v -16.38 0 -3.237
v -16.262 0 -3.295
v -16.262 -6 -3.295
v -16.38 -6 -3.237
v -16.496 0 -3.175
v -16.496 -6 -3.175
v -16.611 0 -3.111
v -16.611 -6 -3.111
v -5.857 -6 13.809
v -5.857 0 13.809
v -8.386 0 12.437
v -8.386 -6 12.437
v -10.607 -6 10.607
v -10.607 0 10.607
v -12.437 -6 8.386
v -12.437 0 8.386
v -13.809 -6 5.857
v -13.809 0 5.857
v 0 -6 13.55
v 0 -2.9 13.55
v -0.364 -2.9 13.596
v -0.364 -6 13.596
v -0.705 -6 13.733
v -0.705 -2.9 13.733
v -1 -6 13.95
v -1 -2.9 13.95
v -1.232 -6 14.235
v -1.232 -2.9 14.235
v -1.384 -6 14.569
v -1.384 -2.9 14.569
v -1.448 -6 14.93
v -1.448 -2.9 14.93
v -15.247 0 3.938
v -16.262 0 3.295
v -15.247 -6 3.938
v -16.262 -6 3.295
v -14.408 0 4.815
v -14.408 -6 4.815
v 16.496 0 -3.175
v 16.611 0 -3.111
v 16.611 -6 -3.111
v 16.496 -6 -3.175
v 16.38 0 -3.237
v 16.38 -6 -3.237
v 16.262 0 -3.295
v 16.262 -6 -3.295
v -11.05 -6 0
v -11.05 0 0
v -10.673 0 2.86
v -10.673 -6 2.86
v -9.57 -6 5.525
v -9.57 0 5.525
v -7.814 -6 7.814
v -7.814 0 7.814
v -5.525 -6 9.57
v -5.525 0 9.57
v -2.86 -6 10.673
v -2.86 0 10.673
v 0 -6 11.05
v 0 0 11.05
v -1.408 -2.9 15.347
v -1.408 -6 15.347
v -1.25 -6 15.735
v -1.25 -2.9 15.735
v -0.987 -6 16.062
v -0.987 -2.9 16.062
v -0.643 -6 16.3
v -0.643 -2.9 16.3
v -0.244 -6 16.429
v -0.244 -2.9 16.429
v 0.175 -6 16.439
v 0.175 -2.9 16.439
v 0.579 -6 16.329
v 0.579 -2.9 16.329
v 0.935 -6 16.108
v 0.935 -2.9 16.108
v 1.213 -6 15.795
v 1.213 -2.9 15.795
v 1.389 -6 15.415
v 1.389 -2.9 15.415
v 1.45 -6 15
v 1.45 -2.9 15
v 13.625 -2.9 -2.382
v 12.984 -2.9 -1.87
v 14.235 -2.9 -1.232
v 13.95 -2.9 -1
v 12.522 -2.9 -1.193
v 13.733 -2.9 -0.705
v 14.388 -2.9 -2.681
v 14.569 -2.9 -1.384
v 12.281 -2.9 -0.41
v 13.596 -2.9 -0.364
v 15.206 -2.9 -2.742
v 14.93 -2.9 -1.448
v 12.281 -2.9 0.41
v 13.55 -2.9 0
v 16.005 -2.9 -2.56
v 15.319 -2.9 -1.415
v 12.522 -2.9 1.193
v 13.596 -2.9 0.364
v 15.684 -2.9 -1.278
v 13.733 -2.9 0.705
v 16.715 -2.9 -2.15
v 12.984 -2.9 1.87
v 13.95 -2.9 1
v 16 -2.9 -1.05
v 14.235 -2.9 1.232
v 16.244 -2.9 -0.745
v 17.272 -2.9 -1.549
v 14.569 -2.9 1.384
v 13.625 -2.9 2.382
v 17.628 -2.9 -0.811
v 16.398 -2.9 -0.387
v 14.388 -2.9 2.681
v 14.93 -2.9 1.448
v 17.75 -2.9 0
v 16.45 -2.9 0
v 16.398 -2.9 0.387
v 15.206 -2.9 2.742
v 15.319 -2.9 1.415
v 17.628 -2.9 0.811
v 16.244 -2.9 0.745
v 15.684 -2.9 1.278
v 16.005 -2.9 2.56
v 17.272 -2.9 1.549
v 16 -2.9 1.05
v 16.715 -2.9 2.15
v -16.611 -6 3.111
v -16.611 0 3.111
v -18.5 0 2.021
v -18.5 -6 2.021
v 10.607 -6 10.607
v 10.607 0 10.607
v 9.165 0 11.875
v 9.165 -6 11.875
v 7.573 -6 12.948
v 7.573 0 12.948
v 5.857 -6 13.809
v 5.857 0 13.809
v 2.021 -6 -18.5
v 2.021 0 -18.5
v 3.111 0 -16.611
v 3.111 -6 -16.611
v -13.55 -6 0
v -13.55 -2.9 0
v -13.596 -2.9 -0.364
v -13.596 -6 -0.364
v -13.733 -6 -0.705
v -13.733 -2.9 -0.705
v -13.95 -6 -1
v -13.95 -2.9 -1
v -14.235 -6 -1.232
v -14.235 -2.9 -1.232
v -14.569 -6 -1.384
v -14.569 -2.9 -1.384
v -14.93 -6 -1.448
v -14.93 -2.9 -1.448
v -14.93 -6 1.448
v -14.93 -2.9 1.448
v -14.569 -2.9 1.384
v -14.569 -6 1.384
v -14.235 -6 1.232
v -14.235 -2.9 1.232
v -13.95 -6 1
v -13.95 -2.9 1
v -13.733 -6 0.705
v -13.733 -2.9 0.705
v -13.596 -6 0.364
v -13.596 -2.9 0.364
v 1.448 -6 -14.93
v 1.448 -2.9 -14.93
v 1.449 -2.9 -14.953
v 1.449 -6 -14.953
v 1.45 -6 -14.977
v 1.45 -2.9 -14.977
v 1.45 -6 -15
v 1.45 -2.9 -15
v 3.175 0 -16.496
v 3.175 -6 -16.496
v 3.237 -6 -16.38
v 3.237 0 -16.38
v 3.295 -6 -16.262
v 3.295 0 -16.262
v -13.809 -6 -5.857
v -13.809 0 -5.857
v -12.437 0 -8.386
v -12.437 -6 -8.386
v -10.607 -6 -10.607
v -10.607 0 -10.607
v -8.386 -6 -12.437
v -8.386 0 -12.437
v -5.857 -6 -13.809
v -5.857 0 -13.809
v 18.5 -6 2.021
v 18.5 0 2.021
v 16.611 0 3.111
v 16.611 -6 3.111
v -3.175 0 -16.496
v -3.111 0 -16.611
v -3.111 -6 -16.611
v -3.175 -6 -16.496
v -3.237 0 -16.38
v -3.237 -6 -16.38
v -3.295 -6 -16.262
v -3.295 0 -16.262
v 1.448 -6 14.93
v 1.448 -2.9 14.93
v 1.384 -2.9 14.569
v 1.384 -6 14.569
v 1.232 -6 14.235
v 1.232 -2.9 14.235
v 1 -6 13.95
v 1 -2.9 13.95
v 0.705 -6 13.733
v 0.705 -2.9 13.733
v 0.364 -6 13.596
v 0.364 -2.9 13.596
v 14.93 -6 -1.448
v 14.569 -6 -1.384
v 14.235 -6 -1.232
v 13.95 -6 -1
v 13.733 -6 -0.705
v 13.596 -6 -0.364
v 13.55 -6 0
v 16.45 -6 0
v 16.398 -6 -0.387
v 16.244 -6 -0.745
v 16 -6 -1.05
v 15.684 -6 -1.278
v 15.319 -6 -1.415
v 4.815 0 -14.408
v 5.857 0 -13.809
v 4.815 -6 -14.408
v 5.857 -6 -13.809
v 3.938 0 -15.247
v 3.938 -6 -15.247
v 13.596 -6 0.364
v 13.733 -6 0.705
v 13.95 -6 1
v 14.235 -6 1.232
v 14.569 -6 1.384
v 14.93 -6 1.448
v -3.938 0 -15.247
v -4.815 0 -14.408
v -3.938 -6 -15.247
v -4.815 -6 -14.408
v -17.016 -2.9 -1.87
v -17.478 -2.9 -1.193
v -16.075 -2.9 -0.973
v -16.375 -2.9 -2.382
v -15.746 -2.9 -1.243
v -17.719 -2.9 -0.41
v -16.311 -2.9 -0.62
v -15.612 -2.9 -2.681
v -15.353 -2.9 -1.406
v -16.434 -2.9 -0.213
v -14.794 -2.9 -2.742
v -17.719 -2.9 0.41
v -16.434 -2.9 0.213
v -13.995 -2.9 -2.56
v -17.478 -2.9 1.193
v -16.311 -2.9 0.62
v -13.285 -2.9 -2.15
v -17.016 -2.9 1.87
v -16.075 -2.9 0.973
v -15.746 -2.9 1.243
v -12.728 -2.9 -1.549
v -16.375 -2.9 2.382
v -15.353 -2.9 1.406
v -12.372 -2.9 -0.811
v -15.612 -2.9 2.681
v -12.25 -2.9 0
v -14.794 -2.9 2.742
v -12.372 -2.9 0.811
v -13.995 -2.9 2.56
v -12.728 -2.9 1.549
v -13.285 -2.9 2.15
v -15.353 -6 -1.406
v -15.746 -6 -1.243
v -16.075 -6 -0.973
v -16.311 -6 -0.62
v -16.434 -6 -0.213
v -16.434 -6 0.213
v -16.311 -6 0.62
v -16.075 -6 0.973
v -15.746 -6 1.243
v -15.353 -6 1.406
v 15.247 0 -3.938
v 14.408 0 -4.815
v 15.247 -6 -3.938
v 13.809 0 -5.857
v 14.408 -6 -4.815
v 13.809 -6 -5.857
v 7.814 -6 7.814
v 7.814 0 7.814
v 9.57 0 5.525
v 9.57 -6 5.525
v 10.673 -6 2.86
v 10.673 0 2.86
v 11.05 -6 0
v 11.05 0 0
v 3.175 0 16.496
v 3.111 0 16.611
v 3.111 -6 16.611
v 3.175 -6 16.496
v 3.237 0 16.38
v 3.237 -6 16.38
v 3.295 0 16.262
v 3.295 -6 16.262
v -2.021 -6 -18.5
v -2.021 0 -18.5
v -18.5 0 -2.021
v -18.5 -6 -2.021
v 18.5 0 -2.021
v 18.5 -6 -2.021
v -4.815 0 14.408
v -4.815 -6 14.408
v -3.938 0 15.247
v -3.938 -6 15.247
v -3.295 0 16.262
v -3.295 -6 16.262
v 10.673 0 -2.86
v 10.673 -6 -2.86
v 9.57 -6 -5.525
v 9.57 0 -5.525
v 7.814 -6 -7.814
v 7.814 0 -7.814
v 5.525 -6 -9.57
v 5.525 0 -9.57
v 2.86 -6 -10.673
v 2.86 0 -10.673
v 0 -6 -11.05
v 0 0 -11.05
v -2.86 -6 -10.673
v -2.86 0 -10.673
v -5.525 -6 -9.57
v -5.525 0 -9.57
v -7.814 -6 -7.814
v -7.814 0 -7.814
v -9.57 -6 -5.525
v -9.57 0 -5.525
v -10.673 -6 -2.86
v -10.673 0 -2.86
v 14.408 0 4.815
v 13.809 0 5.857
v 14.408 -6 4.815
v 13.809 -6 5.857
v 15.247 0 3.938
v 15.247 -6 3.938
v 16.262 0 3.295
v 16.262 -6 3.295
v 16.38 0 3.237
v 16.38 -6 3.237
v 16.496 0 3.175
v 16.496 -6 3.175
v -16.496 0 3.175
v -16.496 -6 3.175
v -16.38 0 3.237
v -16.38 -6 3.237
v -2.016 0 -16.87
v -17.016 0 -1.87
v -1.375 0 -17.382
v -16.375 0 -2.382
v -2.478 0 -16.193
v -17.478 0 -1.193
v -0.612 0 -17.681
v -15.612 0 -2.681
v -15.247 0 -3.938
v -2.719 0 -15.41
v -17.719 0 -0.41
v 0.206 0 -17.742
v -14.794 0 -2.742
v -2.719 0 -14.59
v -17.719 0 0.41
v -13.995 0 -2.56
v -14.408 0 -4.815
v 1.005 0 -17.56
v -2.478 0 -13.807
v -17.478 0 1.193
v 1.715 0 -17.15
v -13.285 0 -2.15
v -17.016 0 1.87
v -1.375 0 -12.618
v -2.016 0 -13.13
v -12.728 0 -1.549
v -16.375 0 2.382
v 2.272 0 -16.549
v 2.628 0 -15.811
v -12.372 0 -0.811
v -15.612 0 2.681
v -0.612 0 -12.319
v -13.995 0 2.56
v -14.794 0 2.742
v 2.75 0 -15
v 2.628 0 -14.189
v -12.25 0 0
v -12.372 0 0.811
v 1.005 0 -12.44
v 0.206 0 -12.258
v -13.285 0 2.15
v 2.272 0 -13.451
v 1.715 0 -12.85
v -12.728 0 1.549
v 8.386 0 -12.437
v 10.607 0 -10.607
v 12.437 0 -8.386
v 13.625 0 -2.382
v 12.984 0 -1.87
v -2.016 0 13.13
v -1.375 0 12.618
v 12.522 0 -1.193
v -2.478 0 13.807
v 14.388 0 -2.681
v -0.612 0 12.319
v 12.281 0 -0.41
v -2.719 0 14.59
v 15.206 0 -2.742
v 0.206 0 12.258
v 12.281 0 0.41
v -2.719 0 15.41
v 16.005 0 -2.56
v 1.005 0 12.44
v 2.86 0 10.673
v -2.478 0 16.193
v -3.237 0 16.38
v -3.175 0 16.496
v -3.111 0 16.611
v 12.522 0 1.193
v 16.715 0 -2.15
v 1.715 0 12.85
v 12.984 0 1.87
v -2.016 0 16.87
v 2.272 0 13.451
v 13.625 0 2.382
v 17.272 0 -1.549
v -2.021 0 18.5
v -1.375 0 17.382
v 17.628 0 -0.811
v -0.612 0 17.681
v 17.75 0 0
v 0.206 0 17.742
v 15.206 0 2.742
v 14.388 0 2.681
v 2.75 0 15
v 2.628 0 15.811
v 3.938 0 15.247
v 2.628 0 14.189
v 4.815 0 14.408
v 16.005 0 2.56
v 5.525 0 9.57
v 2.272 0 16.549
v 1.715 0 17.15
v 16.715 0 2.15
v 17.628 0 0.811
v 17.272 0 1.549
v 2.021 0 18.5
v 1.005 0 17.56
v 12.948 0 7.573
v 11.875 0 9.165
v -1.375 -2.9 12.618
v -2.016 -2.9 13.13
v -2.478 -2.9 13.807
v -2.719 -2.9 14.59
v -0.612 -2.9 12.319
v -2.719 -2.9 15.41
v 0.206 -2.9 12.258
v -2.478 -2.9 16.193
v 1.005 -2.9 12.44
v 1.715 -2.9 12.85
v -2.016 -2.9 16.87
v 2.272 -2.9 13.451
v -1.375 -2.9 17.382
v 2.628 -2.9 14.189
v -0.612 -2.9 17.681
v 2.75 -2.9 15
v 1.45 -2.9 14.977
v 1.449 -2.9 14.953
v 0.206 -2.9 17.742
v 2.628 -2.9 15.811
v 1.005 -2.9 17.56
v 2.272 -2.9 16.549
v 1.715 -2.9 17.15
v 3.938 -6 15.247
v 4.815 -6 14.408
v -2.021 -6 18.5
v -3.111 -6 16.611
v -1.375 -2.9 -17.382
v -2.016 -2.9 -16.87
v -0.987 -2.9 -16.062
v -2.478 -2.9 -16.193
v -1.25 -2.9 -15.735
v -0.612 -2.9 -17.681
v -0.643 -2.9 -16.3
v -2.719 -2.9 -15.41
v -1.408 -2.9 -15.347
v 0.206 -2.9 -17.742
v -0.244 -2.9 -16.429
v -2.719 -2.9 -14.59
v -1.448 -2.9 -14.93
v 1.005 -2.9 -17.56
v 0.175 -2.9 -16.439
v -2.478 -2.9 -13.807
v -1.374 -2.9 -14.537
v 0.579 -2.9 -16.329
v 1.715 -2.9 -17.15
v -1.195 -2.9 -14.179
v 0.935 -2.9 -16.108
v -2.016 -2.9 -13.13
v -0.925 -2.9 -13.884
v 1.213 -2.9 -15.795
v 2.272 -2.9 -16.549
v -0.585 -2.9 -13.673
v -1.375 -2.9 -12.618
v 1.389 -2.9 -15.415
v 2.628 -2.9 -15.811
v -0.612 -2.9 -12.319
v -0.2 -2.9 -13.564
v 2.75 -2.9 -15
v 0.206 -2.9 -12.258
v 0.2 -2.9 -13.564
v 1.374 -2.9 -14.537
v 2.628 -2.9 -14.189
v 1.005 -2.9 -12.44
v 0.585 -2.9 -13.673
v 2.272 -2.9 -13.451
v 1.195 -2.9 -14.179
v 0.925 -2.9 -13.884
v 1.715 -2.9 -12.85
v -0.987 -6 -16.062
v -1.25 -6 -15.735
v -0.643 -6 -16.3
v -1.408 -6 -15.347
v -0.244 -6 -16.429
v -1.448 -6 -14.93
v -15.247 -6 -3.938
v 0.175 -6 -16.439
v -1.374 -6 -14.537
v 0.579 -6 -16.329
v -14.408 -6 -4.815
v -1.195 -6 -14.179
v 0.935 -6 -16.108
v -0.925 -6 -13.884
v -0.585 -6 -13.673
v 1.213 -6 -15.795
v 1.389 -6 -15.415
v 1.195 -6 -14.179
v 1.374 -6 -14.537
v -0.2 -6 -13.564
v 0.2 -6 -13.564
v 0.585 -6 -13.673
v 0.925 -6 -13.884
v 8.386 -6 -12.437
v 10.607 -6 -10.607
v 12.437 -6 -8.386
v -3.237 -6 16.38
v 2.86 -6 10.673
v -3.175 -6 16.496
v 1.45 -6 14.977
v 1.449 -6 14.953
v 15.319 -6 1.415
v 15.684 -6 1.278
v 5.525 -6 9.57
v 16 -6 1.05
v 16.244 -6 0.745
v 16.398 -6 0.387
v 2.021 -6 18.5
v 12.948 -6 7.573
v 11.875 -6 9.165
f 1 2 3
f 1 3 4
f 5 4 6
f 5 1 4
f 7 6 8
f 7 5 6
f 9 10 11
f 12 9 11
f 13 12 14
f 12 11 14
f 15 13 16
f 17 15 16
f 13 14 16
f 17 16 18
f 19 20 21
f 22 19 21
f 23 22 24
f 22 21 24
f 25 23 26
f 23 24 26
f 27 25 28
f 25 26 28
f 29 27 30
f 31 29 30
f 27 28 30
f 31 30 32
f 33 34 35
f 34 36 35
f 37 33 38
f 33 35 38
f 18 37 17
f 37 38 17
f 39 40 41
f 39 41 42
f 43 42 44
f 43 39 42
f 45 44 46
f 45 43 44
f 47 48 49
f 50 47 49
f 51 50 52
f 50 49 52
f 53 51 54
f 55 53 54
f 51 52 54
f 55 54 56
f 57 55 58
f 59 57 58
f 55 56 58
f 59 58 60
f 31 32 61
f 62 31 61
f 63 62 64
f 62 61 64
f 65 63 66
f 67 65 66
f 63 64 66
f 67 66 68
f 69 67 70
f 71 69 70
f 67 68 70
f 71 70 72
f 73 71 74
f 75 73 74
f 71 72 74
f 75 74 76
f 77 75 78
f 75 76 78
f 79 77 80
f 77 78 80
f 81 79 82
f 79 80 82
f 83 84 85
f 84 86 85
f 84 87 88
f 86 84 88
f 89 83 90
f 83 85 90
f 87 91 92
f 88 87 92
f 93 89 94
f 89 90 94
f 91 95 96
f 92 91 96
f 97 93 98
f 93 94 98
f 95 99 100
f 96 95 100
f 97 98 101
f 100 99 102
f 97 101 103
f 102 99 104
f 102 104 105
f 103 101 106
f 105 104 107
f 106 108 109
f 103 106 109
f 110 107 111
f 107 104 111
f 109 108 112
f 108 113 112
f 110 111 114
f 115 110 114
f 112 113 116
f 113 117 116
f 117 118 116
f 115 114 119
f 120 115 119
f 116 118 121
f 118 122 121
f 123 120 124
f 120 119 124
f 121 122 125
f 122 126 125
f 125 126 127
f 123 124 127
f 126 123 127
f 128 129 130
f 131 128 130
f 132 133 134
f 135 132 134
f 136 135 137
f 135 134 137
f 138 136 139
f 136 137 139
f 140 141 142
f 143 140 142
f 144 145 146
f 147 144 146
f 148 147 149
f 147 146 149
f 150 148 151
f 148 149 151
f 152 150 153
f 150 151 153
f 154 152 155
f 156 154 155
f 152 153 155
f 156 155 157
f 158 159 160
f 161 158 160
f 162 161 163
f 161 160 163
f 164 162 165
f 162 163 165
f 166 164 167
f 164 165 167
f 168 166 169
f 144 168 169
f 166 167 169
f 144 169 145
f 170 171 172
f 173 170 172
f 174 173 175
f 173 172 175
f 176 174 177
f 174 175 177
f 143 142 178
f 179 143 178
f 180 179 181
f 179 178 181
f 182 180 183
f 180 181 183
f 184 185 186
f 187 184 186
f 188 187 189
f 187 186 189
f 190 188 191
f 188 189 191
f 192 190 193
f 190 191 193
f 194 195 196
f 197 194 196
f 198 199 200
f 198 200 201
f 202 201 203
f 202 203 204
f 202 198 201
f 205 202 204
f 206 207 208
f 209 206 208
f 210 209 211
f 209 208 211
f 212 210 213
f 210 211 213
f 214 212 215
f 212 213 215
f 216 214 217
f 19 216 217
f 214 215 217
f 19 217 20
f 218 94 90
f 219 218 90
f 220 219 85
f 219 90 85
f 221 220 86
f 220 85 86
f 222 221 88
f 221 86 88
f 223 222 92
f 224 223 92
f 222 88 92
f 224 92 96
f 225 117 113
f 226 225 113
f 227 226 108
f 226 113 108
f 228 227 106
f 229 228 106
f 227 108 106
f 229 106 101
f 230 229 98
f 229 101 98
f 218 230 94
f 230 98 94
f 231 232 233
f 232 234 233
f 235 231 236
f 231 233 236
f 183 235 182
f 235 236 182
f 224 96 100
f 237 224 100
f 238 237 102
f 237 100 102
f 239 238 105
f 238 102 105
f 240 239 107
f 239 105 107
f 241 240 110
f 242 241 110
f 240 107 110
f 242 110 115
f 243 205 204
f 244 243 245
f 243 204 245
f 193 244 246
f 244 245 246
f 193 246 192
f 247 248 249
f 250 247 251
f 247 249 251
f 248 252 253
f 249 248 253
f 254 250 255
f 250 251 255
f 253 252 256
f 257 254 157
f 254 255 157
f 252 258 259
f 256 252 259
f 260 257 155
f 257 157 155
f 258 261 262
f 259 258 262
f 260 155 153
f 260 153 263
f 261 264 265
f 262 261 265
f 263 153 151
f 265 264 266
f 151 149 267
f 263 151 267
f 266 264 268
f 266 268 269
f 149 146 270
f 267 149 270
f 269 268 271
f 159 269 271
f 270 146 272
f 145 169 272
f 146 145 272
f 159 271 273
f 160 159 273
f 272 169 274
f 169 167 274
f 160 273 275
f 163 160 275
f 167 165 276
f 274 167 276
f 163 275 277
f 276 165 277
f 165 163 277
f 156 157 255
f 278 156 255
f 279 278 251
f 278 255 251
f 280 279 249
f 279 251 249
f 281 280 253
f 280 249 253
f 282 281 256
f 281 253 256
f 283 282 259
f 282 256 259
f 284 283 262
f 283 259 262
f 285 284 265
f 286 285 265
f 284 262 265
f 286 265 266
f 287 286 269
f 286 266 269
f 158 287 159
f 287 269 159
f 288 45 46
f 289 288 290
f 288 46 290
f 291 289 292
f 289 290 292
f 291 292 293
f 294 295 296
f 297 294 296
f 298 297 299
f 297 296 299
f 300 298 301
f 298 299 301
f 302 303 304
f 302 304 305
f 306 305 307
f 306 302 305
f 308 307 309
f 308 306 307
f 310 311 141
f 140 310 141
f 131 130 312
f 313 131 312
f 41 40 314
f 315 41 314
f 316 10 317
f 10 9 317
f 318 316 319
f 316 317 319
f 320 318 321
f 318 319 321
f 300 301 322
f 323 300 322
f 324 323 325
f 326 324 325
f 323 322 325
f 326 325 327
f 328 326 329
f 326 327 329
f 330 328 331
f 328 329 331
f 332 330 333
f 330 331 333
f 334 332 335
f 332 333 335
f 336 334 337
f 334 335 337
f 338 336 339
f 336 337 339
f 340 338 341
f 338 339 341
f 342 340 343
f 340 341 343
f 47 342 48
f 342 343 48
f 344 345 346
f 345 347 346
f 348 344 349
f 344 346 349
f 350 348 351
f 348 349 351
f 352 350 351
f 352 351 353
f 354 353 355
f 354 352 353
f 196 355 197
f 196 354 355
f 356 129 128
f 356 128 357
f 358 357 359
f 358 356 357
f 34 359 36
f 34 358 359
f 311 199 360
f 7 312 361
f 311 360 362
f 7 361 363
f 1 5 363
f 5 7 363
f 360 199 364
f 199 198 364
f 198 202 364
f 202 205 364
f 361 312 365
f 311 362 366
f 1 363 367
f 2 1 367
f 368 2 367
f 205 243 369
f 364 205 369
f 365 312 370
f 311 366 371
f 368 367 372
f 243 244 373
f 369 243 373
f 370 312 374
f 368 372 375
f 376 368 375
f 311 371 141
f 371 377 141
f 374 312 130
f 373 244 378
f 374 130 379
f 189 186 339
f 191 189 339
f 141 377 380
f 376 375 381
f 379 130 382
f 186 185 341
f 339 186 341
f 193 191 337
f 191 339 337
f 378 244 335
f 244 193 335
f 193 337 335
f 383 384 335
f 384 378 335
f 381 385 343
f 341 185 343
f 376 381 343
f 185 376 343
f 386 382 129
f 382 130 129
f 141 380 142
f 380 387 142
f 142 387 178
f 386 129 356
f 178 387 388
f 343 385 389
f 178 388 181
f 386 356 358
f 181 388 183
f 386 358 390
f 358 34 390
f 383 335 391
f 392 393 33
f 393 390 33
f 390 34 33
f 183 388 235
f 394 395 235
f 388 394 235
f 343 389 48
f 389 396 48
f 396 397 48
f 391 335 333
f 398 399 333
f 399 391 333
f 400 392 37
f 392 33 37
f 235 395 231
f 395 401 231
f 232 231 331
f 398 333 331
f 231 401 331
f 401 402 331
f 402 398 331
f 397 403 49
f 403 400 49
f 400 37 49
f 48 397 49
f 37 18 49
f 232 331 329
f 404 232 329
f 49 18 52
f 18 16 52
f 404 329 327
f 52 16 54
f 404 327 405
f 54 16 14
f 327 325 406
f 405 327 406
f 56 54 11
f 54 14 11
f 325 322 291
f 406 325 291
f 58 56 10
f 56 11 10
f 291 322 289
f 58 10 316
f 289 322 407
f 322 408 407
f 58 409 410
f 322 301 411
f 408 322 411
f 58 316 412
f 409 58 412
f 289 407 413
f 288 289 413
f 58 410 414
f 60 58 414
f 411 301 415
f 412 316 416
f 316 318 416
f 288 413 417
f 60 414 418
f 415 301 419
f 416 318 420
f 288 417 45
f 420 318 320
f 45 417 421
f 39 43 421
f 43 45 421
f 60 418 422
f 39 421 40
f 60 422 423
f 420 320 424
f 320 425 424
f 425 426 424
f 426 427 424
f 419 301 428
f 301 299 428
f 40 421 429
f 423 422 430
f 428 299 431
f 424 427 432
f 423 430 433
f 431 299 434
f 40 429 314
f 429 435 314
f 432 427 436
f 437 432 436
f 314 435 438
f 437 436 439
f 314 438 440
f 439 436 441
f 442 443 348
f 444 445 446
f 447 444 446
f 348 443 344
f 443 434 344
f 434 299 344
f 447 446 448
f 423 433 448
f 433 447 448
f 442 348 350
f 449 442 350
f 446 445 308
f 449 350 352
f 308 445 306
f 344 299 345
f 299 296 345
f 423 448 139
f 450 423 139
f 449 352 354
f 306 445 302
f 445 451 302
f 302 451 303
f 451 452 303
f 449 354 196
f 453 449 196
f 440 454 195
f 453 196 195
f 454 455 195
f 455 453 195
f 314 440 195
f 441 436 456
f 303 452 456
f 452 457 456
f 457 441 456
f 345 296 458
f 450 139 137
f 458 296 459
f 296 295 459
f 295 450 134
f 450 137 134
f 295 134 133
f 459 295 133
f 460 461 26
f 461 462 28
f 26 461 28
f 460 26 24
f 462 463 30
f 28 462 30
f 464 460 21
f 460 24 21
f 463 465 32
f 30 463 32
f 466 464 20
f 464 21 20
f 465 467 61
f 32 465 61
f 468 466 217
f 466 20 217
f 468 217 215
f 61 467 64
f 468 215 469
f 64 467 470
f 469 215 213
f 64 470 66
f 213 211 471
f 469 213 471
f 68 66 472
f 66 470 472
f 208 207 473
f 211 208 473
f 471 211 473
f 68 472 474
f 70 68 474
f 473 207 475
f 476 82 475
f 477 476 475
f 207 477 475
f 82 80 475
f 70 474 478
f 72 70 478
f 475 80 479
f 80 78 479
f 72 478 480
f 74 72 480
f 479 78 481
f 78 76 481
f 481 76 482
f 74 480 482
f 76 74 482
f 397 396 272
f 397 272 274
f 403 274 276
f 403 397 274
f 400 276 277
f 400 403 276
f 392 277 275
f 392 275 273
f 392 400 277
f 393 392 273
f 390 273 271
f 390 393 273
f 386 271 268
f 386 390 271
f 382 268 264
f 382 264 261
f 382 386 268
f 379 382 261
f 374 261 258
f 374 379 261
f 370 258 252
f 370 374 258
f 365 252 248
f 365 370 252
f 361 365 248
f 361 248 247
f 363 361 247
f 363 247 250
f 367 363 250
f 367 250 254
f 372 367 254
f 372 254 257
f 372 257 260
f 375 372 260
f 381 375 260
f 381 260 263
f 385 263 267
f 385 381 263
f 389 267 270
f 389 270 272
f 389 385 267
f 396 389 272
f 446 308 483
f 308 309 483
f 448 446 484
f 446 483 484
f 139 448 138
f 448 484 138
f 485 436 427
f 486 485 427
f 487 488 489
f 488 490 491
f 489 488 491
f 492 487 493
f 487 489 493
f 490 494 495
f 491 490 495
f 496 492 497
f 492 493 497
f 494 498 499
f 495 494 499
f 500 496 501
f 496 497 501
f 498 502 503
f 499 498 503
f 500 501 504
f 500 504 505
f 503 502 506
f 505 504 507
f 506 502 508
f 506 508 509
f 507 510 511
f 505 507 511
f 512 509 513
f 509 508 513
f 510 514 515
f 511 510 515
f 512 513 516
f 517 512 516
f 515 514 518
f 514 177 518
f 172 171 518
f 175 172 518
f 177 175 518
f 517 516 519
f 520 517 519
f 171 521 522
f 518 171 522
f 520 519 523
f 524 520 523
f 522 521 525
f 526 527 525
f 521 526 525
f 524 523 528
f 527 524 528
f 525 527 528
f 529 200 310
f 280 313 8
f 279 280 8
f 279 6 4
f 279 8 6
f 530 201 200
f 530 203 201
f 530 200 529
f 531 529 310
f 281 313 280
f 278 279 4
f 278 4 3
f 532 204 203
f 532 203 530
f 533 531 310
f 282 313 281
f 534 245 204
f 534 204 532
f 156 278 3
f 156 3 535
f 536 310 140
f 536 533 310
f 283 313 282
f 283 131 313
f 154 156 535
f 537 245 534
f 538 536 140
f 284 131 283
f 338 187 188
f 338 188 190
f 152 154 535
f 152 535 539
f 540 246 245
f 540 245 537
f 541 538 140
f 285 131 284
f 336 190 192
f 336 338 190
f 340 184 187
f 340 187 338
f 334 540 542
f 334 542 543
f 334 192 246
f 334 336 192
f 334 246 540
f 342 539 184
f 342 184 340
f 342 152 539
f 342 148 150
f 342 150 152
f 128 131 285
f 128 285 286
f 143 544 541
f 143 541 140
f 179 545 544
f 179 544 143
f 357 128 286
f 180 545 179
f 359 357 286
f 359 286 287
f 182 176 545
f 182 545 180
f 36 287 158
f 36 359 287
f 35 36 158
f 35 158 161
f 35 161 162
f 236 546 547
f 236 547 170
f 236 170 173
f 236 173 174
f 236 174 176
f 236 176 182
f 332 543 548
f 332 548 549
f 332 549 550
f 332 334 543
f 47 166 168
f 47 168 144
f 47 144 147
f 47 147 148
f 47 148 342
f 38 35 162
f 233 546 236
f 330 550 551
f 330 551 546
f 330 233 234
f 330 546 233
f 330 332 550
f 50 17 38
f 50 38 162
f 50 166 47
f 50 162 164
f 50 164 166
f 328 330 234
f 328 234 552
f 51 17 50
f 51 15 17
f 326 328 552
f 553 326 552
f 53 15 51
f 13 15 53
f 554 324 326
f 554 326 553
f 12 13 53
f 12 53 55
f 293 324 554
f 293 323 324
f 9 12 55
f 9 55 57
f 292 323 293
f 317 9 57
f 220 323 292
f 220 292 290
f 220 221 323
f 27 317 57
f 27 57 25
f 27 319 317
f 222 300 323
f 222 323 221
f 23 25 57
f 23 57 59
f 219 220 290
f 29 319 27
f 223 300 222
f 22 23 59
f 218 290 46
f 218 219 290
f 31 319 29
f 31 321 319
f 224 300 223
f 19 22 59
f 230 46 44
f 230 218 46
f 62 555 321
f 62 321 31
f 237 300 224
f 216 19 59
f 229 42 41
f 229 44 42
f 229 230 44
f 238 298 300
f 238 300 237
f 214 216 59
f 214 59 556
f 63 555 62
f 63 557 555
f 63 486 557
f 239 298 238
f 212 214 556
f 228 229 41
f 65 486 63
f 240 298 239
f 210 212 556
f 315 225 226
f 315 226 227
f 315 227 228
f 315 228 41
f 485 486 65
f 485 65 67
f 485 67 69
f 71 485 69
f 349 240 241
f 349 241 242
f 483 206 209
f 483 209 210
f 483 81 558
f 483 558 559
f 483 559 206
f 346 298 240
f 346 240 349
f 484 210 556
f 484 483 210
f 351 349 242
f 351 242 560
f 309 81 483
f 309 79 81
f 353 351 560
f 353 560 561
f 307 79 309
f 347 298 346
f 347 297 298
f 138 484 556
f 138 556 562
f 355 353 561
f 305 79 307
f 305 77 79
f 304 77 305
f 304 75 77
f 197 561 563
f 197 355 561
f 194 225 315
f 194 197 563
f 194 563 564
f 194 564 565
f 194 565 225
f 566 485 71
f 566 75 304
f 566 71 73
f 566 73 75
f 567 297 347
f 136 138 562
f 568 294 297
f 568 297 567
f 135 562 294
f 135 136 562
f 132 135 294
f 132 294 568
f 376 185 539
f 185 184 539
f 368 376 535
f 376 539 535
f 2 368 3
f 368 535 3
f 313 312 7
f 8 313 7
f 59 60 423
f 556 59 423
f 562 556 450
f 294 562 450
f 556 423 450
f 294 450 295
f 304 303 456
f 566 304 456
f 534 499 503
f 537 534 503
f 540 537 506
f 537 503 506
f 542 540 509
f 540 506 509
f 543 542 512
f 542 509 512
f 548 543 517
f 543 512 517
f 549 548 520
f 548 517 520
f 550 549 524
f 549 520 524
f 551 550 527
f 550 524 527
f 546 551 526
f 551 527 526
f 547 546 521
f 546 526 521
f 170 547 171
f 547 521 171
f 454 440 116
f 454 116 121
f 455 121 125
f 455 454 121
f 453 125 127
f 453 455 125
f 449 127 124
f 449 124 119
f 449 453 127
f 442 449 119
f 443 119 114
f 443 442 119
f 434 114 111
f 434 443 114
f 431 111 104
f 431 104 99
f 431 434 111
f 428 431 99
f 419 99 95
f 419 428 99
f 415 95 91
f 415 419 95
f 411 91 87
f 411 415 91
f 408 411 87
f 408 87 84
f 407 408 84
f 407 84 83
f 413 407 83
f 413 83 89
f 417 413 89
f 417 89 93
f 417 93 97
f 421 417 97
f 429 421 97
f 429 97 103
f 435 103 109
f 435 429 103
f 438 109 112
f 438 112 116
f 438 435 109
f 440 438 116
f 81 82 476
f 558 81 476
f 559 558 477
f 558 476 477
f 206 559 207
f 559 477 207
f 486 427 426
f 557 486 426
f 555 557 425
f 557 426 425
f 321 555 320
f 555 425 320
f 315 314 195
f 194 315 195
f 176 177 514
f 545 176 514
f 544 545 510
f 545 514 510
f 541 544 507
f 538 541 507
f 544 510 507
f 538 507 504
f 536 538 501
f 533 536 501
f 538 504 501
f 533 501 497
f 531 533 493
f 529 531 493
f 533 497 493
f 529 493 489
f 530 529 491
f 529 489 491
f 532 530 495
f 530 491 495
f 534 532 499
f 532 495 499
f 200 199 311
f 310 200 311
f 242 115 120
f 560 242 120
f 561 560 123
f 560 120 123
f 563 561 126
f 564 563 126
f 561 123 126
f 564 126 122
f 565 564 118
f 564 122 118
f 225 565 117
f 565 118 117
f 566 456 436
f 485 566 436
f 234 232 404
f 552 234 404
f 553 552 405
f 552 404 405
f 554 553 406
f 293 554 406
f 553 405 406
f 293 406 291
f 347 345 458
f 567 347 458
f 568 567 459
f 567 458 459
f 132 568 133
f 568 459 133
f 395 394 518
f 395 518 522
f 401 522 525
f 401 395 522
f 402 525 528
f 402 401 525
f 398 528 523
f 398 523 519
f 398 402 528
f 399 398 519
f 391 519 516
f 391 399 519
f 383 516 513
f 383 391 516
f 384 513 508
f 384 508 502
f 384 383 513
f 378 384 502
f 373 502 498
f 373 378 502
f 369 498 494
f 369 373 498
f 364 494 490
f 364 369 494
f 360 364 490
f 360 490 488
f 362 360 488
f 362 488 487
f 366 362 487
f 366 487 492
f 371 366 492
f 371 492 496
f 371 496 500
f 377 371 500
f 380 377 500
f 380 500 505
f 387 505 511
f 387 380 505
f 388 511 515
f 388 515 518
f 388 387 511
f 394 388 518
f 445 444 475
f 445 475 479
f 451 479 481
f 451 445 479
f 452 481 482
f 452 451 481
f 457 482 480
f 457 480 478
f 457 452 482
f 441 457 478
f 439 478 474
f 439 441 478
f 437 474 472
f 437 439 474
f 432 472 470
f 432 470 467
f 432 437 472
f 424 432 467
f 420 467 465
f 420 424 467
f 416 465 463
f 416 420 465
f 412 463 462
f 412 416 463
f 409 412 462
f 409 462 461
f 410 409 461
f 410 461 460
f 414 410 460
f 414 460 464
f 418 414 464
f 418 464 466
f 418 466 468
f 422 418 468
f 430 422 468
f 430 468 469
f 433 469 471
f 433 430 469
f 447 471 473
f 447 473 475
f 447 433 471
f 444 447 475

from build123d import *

# Parameters (mm, degrees)
F1_DEPTH     = 6
F2_T1_DEPTH  = 15.3027934974
F3_R         = 5
F4_T1_DEPTH  = 15.3027934974
F5_R         = 5
F6_T1_DEPTH  = 15.3027934974
F7_R         = 5
F8_T1_DEPTH  = 15.3027934974
F9_R         = 5
F10_T1_DEPTH = 15.3027934974
F11_R        = 5
F12_T1_DEPTH = 15.3027934974
F13_R        = 5
F14_R        = 2.75
F15_DEPTH    = 2.9


# Not quite as in the source:
# - a fillet or chamfer that OpenCascade refuses, or shapes differently, is made with other operations: its cross-section is extruded or revolved along the edge and cut away or added


with BuildPart() as f1:
    # F0 (on Front) → F1 (new body)
    with BuildSketch(Plane.XZ):
        with BuildLine():
            Line((11.5, 0), (11.05, 0))
            ThreePointArc((11.05, 0), (0, -11.05), (-11.05, 0))
            Line((-11.05, 0), (-11.5, 0))
            Line((-11.5, 0), (-11.5, -2.0207259422))
            Line((-11.5, -2.0207259422), (-14.5199840255, -3.7643145323))
            ThreePointArc((-14.5199840255, -3.7643145323), (-10.6066017178, -10.6066017178), (-3.7643145323, -14.5199840255))
            Line((-3.7643145323, -14.5199840255), (-2.0207259422, -11.5))
            Line((-2.0207259422, -11.5), (2.0207259422, -11.5))
            Line((2.0207259422, -11.5), (3.7643145323, -14.5199840255))
            ThreePointArc((3.7643145323, -14.5199840255), (10.6066017178, -10.6066017178), (14.5199840255, -3.7643145323))
            Line((14.5199840255, -3.7643145323), (11.5, -2.0207259422))
            Line((11.5, -2.0207259422), (11.5, 0))
        make_face()
        with BuildLine():
            ThreePointArc((7.8135299321, 7.8135299321), (10.2088688342, 4.2286519276), (11.05, 0))
            Line((11.05, 0), (11.5, 0))
            Line((11.5, 0), (11.5, 2.0207259422))
            Line((11.5, 2.0207259422), (14.5199840255, 3.7643145323))
            ThreePointArc((14.5199840255, 3.7643145323), (13.020773835, 7.4471100931), (10.6066017178, 10.6066017178))
            Line((10.6066017178, 10.6066017178), (7.8135299321, 7.8135299321))
        make_face()
        with BuildLine():
            ThreePointArc((0, 11.05), (4.2286519276, 10.2088688342), (7.8135299321, 7.8135299321))
            Line((7.8135299321, 7.8135299321), (10.6066017178, 10.6066017178))
            ThreePointArc((10.6066017178, 10.6066017178), (7.4471100931, 13.020773835), (3.7643145323, 14.5199840255))
            Line((3.7643145323, 14.5199840255), (2.0207259422, 11.5))
            Line((2.0207259422, 11.5), (0, 11.5))
            Line((0, 11.5), (0, 11.05))
        make_face()
        with BuildLine():
            Line((-11.5, 0), (-11.05, 0))
            ThreePointArc((-11.05, 0), (-7.8135299321, 7.8135299321), (0, 11.05))
            Line((0, 11.05), (0, 11.5))
            Line((0, 11.5), (-2.0207259422, 11.5))
            Line((-2.0207259422, 11.5), (-3.7643145323, 14.5199840255))
            ThreePointArc((-3.7643145323, 14.5199840255), (-10.6066017178, 10.6066017178), (-14.5199840255, 3.7643145323))
            Line((-14.5199840255, 3.7643145323), (-11.5, 2.0207259422))
            Line((-11.5, 2.0207259422), (-11.5, 0))
        make_face()
        with BuildLine():
            Line((11.5, 2.0207259422), (11.5, 0))
            Line((11.5, 0), (13.55, 0))
            ThreePointArc((13.55, 0), (13.9502093463, 1.0002197675), (14.9299166667, 1.4483053291))
            ThreePointArc((14.9299166667, 1.4483053291), (14.770414258, 2.6143570237), (14.5199840255, 3.7643145323))
            Line((14.5199840255, 3.7643145323), (11.5, 2.0207259422))
        make_face()
        with BuildLine():
            Line((13.55, 0), (11.5, 0))
            Line((11.5, 0), (11.5, -2.0207259422))
            Line((11.5, -2.0207259422), (14.5199840255, -3.7643145323))
            ThreePointArc((14.5199840255, -3.7643145323), (14.770414258, -2.6143570237), (14.9299166667, -1.4483053291))
            ThreePointArc((14.9299166667, -1.4483053291), (13.9502093463, -1.0002197675), (13.55, 0))
        make_face()
        with BuildLine():
            Line((-11.5, -2.0207259422), (-11.5, 0))
            Line((-11.5, 0), (-13.55, 0))
            ThreePointArc((-13.55, 0), (-13.9502093463, -1.0002197675), (-14.9299166667, -1.4483053291))
            ThreePointArc((-14.9299166667, -1.4483053291), (-14.770414258, -2.6143570237), (-14.5199840255, -3.7643145323))
            Line((-14.5199840255, -3.7643145323), (-11.5, -2.0207259422))
        make_face()
        with BuildLine():
            Line((-13.55, 0), (-11.5, 0))
            Line((-11.5, 0), (-11.5, 2.0207259422))
            Line((-11.5, 2.0207259422), (-14.5199840255, 3.7643145323))
            ThreePointArc((-14.5199840255, 3.7643145323), (-14.770414258, 2.6143570237), (-14.9299166667, 1.4483053291))
            ThreePointArc((-14.9299166667, 1.4483053291), (-13.9502093463, 1.0002197675), (-13.55, 0))
        make_face()
        with BuildLine():
            Line((0, 13.55), (0, 11.5))
            Line((0, 11.5), (2.0207259422, 11.5))
            Line((2.0207259422, 11.5), (3.7643145323, 14.5199840255))
            ThreePointArc((3.7643145323, 14.5199840255), (2.6143570237, 14.770414258), (1.4483053291, 14.9299166667))
            ThreePointArc((1.4483053291, 14.9299166667), (1.0002197675, 13.9502093463), (0, 13.55))
        make_face()
        with BuildLine():
            Line((-2.0207259422, 11.5), (0, 11.5))
            Line((0, 11.5), (0, 13.55))
            ThreePointArc((0, 13.55), (-1.0002197675, 13.9502093463), (-1.4483053291, 14.9299166667))
            ThreePointArc((-1.4483053291, 14.9299166667), (-2.6143570237, 14.770414258), (-3.7643145323, 14.5199840255))
            Line((-3.7643145323, 14.5199840255), (-2.0207259422, 11.5))
        make_face()
        with BuildLine():
            Line((15, 4.0414518843), (14.5199840255, 3.7643145323))
            ThreePointArc((14.5199840255, 3.7643145323), (14.770414258, 2.6143570237), (14.9299166667, 1.4483053291))
            ThreePointArc((14.9299166667, 1.4483053291), (16.0002197675, 1.0497906537), (16.45, 0))
            ThreePointArc((16.45, 0), (16.0002197675, -1.0497906537), (14.9299166667, -1.4483053291))
            ThreePointArc((14.9299166667, -1.4483053291), (14.770414258, -2.6143570237), (14.5199840255, -3.7643145323))
            Line((14.5199840255, -3.7643145323), (15, -4.0414518843))
            Line((15, -4.0414518843), (18.5, -2.0207259422))
            Line((18.5, -2.0207259422), (18.5, 2.0207259422))
            Line((18.5, 2.0207259422), (15, 4.0414518843))
        make_face()
        with BuildLine():
            ThreePointArc((1.4483053291, 14.9299166667), (2.6143570237, 14.770414258), (3.7643145323, 14.5199840255))
            Line((3.7643145323, 14.5199840255), (4.0414518843, 15))
            Line((4.0414518843, 15), (2.0207259422, 18.5))
            Line((2.0207259422, 18.5), (-2.0207259422, 18.5))
            Line((-2.0207259422, 18.5), (-4.0414518843, 15))
            Line((-4.0414518843, 15), (-3.7643145323, 14.5199840255))
            ThreePointArc((-3.7643145323, 14.5199840255), (-2.6143570237, 14.770414258), (-1.4483053291, 14.9299166667))
            ThreePointArc((-1.4483053291, 14.9299166667), (-0.0350519098, 16.4495762704), (1.45, 15))
            ThreePointArc((1.45, 15), (1.4495762704, 14.9649480902), (1.4483053291, 14.9299166667))
        make_face()
        with BuildLine():
            ThreePointArc((-14.9299166667, -1.4483053291), (-16.45, 0), (-14.9299166667, 1.4483053291))
            ThreePointArc((-14.9299166667, 1.4483053291), (-14.770414258, 2.6143570237), (-14.5199840255, 3.7643145323))
            Line((-14.5199840255, 3.7643145323), (-15, 4.0414518843))
            Line((-15, 4.0414518843), (-18.5, 2.0207259422))
            Line((-18.5, 2.0207259422), (-18.5, -2.0207259422))
            Line((-18.5, -2.0207259422), (-15, -4.0414518843))
            Line((-15, -4.0414518843), (-14.5199840255, -3.7643145323))
            ThreePointArc((-14.5199840255, -3.7643145323), (-14.770414258, -2.6143570237), (-14.9299166667, -1.4483053291))
        make_face()
        with BuildLine():
            Line((4.0414518843, -15), (3.7643145323, -14.5199840255))
            ThreePointArc((3.7643145323, -14.5199840255), (2.6143570237, -14.770414258), (1.4483053291, -14.9299166667))
            ThreePointArc((1.4483053291, -14.9299166667), (1.4495762704, -14.9649480902), (1.45, -15))
            ThreePointArc((1.45, -15), (-0.0350519098, -16.4495762704), (-1.4483053291, -14.9299166667))
            ThreePointArc((-1.4483053291, -14.9299166667), (-2.6143570237, -14.770414258), (-3.7643145323, -14.5199840255))
            Line((-3.7643145323, -14.5199840255), (-4.0414518843, -15))
            Line((-4.0414518843, -15), (-2.0207259422, -18.5))
            Line((-2.0207259422, -18.5), (2.0207259422, -18.5))
            Line((2.0207259422, -18.5), (4.0414518843, -15))
        make_face()
        with BuildLine():
            ThreePointArc((1.4483053291, -14.9299166667), (2.6143570237, -14.770414258), (3.7643145323, -14.5199840255))
            Line((3.7643145323, -14.5199840255), (2.0207259422, -11.5))
            Line((2.0207259422, -11.5), (-2.0207259422, -11.5))
            Line((-2.0207259422, -11.5), (-3.7643145323, -14.5199840255))
            ThreePointArc((-3.7643145323, -14.5199840255), (-2.6143570237, -14.770414258), (-1.4483053291, -14.9299166667))
            ThreePointArc((-1.4483053291, -14.9299166667), (0, -13.55), (1.4483053291, -14.9299166667))
        make_face()
    extrude(amount=F1_DEPTH)

    # F2: fillet of radius 5 on 1 edges, made by hand

    # F2_s2 → F2_t1 (cut)
    with BuildSketch(Plane.XZ.offset(-4.6513967487)):
        with BuildLine():
            ThreePointArc((-3.1111725346, 16.611291099), (-3.5536996774, 15.6018521519), (-3.7643145323, 14.5199840255))
            Line((-3.7643145323, 14.5199840255), (-3.8639799126, 14.5281578841))
            ThreePointArc((-3.8639799126, 14.5281578841), (-3.9894857487, 14.7099920128), (-4.1280544247, 14.95))
            Line((-4.1280544247, 14.95), (-4.1280544247, 15.05))
            Line((-4.1280544247, 15.05), (-3.197775075, 16.661291099))
            Line((-3.197775075, 16.661291099), (-3.1111725346, 16.611291099))
        make_face()
    extrude(amount=F2_T1_DEPTH, mode=Mode.SUBTRACT)

    # F3
    f3_edges = [f1.edges().sort_by_distance(p)[0] for p in [
        (-3.764315, -3, 14.519984),
    ]]
    fillet(f3_edges, radius=F3_R)

    # F4: fillet of radius 5 on 1 edges, made by hand

    # F4_s2 → F4_t1 (cut)
    with BuildSketch(Plane.XZ.offset(-4.6513967487)):
        with BuildLine():
            ThreePointArc((3.1111725346, 16.611291099), (3.5536996774, 15.6018521519), (3.7643145323, 14.5199840255))
            Line((3.7643145323, 14.5199840255), (3.8639799126, 14.5281578841))
            ThreePointArc((3.8639799126, 14.5281578841), (3.9894857487, 14.7099920128), (4.1280544247, 14.95))
            Line((4.1280544247, 14.95), (4.1280544247, 15.05))
            Line((4.1280544247, 15.05), (3.197775075, 16.661291099))
            Line((3.197775075, 16.661291099), (3.1111725346, 16.611291099))
        make_face()
    extrude(amount=F4_T1_DEPTH, mode=Mode.SUBTRACT)

    # F5
    f5_edges = [f1.edges().sort_by_distance(p)[0] for p in [
        (3.764315, -3, 14.519984),
    ]]
    fillet(f5_edges, radius=F5_R)

    # F6: fillet of radius 5 on 2 edges, made by hand

    # F6_s2 → F6_t1 (cut)
    with BuildSketch(Plane.XZ.offset(-4.6513967487)):
        with BuildLine():
            ThreePointArc((14.5199840255, 3.7643145323), (15.6018521519, 3.5536996774), (16.611291099, 3.1111725346))
            Line((16.611291099, 3.1111725346), (16.661291099, 3.197775075))
            Line((16.661291099, 3.197775075), (15.05, 4.1280544247))
            Line((15.05, 4.1280544247), (14.95, 4.1280544247))
            ThreePointArc((14.95, 4.1280544247), (14.7099920128, 3.9894857487), (14.5281578841, 3.8639799126))
            Line((14.5281578841, 3.8639799126), (14.5199840255, 3.7643145323))
        make_face()
        with BuildLine():
            ThreePointArc((16.611291099, -3.1111725346), (15.6018521519, -3.5536996774), (14.5199840255, -3.7643145323))
            Line((14.5199840255, -3.7643145323), (14.5281578841, -3.8639799126))
            ThreePointArc((14.5281578841, -3.8639799126), (14.7099920128, -3.9894857487), (14.95, -4.1280544247))
            Line((14.95, -4.1280544247), (15.05, -4.1280544247))
            Line((15.05, -4.1280544247), (16.661291099, -3.197775075))
            Line((16.661291099, -3.197775075), (16.611291099, -3.1111725346))
        make_face()
    extrude(amount=F6_T1_DEPTH, mode=Mode.SUBTRACT)

    # F7
    f7_edges = [f1.edges().sort_by_distance(p)[0] for p in [
        (14.519984, -3, 3.764315),
        (14.519984, -3, -3.764315),
    ]]
    fillet(f7_edges, radius=F7_R)

    # F8: fillet of radius 5 on 1 edges, made by hand

    # F8_s2 → F8_t1 (cut)
    with BuildSketch(Plane.XZ.offset(-4.6513967487)):
        with BuildLine():
            ThreePointArc((-3.1111725346, -16.611291099), (-3.5536996774, -15.6018521519), (-3.7643145323, -14.5199840255))
            Line((-3.7643145323, -14.5199840255), (-3.8639799126, -14.5281578841))
            ThreePointArc((-3.8639799126, -14.5281578841), (-3.9894857487, -14.7099920128), (-4.1280544247, -14.95))
            Line((-4.1280544247, -14.95), (-4.1280544247, -15.05))
            Line((-4.1280544247, -15.05), (-3.197775075, -16.661291099))
            Line((-3.197775075, -16.661291099), (-3.1111725346, -16.611291099))
        make_face()
    extrude(amount=F8_T1_DEPTH, mode=Mode.SUBTRACT)

    # F9
    f9_edges = [f1.edges().sort_by_distance(p)[0] for p in [
        (-3.764315, -3, -14.519984),
    ]]
    fillet(f9_edges, radius=F9_R)

    # F10: fillet of radius 5 on 1 edges, made by hand

    # F10_s2 → F10_t1 (cut)
    with BuildSketch(Plane.XZ.offset(-4.6513967487)):
        with BuildLine():
            ThreePointArc((3.1111725346, -16.611291099), (3.5536996774, -15.6018521519), (3.7643145323, -14.5199840255))
            Line((3.7643145323, -14.5199840255), (3.8639799126, -14.5281578841))
            ThreePointArc((3.8639799126, -14.5281578841), (3.9894857487, -14.7099920128), (4.1280544247, -14.95))
            Line((4.1280544247, -14.95), (4.1280544247, -15.05))
            Line((4.1280544247, -15.05), (3.197775075, -16.661291099))
            Line((3.197775075, -16.661291099), (3.1111725346, -16.611291099))
        make_face()
    extrude(amount=F10_T1_DEPTH, mode=Mode.SUBTRACT)

    # F11
    f11_edges = [f1.edges().sort_by_distance(p)[0] for p in [
        (3.764315, -3, -14.519984),
    ]]
    fillet(f11_edges, radius=F11_R)

    # F12: fillet of radius 5 on 2 edges, made by hand

    # F12_s2 → F12_t1 (cut)
    with BuildSketch(Plane.XZ.offset(-4.6513967487)):
        with BuildLine():
            ThreePointArc((-14.5199840255, -3.7643145323), (-15.6018521519, -3.5536996774), (-16.611291099, -3.1111725346))
            Line((-16.611291099, -3.1111725346), (-16.661291099, -3.197775075))
            Line((-16.661291099, -3.197775075), (-15.05, -4.1280544247))
            Line((-15.05, -4.1280544247), (-14.95, -4.1280544247))
            ThreePointArc((-14.95, -4.1280544247), (-14.7099920128, -3.9894857487), (-14.5281578841, -3.8639799126))
            Line((-14.5281578841, -3.8639799126), (-14.5199840255, -3.7643145323))
        make_face()
        with BuildLine():
            ThreePointArc((-16.611291099, 3.1111725346), (-15.6018521519, 3.5536996774), (-14.5199840255, 3.7643145323))
            Line((-14.5199840255, 3.7643145323), (-14.5281578841, 3.8639799126))
            ThreePointArc((-14.5281578841, 3.8639799126), (-14.7099920128, 3.9894857487), (-14.95, 4.1280544247))
            Line((-14.95, 4.1280544247), (-15.05, 4.1280544247))
            Line((-15.05, 4.1280544247), (-16.661291099, 3.197775075))
            Line((-16.661291099, 3.197775075), (-16.611291099, 3.1111725346))
        make_face()
    extrude(amount=F12_T1_DEPTH, mode=Mode.SUBTRACT)

    # F13
    f13_edges = [f1.edges().sort_by_distance(p)[0] for p in [
        (-14.519984, -3, 3.764315),
        (-14.519984, -3, -3.764315),
    ]]
    fillet(f13_edges, radius=F13_R)

    # F14 (on Front) → F15 (cut)
    with BuildSketch(Plane.XZ):
        with Locations((0, 15)):
            Circle(F14_R)
        with Locations((0, -15)):
            Circle(F14_R)
        with Locations((15, 0)):
            Circle(F14_R)
        with Locations((-15, 0)):
            Circle(F14_R)
    extrude(amount=F15_DEPTH, mode=Mode.SUBTRACT)


solid = f1.part
